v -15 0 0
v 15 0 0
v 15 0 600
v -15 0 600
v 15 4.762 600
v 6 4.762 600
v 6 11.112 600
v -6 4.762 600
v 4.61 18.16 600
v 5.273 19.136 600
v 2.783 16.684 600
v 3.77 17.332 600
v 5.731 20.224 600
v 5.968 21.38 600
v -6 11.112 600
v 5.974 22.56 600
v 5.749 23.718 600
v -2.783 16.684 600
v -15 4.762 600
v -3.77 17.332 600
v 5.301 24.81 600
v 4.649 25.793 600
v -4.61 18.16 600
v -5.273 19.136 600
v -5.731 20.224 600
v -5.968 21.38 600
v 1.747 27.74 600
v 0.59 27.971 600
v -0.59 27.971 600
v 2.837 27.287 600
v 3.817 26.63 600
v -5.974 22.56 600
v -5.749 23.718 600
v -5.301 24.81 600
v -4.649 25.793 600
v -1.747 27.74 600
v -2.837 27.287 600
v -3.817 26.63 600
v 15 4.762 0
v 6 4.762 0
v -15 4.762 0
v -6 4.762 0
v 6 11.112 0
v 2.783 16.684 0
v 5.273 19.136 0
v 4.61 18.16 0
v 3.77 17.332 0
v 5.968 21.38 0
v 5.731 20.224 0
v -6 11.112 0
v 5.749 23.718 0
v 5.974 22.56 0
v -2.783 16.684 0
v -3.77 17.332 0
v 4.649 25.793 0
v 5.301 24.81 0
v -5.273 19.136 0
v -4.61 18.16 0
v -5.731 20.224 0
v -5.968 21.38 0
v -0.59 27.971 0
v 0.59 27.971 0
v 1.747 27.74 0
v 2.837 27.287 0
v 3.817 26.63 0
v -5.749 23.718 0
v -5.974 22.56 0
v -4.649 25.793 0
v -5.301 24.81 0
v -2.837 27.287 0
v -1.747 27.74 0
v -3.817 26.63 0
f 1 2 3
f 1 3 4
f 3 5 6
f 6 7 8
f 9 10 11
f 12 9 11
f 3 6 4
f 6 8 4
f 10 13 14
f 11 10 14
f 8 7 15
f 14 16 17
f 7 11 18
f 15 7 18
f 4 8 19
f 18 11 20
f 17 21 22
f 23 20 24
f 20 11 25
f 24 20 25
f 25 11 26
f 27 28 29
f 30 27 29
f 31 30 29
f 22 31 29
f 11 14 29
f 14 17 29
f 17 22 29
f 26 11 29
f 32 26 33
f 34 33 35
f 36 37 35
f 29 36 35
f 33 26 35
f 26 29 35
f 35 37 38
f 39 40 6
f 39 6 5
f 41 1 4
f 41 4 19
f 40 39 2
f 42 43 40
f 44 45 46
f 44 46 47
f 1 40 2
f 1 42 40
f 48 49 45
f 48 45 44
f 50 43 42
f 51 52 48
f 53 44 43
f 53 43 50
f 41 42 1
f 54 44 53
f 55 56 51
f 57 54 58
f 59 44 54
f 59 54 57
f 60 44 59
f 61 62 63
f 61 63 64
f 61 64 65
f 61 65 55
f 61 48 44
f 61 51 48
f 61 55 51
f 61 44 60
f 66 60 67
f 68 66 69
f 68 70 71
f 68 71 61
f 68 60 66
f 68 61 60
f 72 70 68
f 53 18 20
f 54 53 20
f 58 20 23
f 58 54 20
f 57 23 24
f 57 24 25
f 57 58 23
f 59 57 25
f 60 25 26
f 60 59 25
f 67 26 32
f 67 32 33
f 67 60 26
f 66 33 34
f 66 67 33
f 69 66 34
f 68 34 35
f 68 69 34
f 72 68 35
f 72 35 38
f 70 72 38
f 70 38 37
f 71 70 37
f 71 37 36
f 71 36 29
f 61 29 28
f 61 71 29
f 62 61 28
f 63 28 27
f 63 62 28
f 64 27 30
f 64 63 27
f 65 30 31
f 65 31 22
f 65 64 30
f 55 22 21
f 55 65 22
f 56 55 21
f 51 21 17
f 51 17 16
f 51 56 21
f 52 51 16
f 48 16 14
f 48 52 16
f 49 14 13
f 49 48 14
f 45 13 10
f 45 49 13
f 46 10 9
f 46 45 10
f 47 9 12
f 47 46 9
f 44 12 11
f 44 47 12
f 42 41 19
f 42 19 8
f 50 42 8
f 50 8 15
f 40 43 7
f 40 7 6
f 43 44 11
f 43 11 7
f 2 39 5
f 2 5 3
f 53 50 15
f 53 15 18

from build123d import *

# Parameters (mm, degrees)
BOSS_EXTRUDE1_DEPTH = 600


with BuildPart() as part:
    # Sketch1 → Boss-Extrude1 (new body)
    with BuildSketch(Plane.XY):
        with BuildLine():
            Line((15, 0), (-15, 0))
            Line((-15, 0), (-15, 4.7625))
            Line((-15, 4.7625), (-6, 4.7625))
            Line((-6, 4.7625), (-6, 11.1125))
            Line((-6, 11.1125), (-2.783018763, 16.684474949))
            ThreePointArc((-2.783018763, 16.684474949), (0, 28), (2.783018763, 16.684474949))
            Line((2.783018763, 16.684474949), (6, 11.1125))
            Line((6, 11.1125), (6, 4.7625))
            Line((6, 4.7625), (15, 4.7625))
            Line((15, 4.7625), (15, 0))
        make_face()
    extrude(amount=BOSS_EXTRUDE1_DEPTH)


solid = part.part
